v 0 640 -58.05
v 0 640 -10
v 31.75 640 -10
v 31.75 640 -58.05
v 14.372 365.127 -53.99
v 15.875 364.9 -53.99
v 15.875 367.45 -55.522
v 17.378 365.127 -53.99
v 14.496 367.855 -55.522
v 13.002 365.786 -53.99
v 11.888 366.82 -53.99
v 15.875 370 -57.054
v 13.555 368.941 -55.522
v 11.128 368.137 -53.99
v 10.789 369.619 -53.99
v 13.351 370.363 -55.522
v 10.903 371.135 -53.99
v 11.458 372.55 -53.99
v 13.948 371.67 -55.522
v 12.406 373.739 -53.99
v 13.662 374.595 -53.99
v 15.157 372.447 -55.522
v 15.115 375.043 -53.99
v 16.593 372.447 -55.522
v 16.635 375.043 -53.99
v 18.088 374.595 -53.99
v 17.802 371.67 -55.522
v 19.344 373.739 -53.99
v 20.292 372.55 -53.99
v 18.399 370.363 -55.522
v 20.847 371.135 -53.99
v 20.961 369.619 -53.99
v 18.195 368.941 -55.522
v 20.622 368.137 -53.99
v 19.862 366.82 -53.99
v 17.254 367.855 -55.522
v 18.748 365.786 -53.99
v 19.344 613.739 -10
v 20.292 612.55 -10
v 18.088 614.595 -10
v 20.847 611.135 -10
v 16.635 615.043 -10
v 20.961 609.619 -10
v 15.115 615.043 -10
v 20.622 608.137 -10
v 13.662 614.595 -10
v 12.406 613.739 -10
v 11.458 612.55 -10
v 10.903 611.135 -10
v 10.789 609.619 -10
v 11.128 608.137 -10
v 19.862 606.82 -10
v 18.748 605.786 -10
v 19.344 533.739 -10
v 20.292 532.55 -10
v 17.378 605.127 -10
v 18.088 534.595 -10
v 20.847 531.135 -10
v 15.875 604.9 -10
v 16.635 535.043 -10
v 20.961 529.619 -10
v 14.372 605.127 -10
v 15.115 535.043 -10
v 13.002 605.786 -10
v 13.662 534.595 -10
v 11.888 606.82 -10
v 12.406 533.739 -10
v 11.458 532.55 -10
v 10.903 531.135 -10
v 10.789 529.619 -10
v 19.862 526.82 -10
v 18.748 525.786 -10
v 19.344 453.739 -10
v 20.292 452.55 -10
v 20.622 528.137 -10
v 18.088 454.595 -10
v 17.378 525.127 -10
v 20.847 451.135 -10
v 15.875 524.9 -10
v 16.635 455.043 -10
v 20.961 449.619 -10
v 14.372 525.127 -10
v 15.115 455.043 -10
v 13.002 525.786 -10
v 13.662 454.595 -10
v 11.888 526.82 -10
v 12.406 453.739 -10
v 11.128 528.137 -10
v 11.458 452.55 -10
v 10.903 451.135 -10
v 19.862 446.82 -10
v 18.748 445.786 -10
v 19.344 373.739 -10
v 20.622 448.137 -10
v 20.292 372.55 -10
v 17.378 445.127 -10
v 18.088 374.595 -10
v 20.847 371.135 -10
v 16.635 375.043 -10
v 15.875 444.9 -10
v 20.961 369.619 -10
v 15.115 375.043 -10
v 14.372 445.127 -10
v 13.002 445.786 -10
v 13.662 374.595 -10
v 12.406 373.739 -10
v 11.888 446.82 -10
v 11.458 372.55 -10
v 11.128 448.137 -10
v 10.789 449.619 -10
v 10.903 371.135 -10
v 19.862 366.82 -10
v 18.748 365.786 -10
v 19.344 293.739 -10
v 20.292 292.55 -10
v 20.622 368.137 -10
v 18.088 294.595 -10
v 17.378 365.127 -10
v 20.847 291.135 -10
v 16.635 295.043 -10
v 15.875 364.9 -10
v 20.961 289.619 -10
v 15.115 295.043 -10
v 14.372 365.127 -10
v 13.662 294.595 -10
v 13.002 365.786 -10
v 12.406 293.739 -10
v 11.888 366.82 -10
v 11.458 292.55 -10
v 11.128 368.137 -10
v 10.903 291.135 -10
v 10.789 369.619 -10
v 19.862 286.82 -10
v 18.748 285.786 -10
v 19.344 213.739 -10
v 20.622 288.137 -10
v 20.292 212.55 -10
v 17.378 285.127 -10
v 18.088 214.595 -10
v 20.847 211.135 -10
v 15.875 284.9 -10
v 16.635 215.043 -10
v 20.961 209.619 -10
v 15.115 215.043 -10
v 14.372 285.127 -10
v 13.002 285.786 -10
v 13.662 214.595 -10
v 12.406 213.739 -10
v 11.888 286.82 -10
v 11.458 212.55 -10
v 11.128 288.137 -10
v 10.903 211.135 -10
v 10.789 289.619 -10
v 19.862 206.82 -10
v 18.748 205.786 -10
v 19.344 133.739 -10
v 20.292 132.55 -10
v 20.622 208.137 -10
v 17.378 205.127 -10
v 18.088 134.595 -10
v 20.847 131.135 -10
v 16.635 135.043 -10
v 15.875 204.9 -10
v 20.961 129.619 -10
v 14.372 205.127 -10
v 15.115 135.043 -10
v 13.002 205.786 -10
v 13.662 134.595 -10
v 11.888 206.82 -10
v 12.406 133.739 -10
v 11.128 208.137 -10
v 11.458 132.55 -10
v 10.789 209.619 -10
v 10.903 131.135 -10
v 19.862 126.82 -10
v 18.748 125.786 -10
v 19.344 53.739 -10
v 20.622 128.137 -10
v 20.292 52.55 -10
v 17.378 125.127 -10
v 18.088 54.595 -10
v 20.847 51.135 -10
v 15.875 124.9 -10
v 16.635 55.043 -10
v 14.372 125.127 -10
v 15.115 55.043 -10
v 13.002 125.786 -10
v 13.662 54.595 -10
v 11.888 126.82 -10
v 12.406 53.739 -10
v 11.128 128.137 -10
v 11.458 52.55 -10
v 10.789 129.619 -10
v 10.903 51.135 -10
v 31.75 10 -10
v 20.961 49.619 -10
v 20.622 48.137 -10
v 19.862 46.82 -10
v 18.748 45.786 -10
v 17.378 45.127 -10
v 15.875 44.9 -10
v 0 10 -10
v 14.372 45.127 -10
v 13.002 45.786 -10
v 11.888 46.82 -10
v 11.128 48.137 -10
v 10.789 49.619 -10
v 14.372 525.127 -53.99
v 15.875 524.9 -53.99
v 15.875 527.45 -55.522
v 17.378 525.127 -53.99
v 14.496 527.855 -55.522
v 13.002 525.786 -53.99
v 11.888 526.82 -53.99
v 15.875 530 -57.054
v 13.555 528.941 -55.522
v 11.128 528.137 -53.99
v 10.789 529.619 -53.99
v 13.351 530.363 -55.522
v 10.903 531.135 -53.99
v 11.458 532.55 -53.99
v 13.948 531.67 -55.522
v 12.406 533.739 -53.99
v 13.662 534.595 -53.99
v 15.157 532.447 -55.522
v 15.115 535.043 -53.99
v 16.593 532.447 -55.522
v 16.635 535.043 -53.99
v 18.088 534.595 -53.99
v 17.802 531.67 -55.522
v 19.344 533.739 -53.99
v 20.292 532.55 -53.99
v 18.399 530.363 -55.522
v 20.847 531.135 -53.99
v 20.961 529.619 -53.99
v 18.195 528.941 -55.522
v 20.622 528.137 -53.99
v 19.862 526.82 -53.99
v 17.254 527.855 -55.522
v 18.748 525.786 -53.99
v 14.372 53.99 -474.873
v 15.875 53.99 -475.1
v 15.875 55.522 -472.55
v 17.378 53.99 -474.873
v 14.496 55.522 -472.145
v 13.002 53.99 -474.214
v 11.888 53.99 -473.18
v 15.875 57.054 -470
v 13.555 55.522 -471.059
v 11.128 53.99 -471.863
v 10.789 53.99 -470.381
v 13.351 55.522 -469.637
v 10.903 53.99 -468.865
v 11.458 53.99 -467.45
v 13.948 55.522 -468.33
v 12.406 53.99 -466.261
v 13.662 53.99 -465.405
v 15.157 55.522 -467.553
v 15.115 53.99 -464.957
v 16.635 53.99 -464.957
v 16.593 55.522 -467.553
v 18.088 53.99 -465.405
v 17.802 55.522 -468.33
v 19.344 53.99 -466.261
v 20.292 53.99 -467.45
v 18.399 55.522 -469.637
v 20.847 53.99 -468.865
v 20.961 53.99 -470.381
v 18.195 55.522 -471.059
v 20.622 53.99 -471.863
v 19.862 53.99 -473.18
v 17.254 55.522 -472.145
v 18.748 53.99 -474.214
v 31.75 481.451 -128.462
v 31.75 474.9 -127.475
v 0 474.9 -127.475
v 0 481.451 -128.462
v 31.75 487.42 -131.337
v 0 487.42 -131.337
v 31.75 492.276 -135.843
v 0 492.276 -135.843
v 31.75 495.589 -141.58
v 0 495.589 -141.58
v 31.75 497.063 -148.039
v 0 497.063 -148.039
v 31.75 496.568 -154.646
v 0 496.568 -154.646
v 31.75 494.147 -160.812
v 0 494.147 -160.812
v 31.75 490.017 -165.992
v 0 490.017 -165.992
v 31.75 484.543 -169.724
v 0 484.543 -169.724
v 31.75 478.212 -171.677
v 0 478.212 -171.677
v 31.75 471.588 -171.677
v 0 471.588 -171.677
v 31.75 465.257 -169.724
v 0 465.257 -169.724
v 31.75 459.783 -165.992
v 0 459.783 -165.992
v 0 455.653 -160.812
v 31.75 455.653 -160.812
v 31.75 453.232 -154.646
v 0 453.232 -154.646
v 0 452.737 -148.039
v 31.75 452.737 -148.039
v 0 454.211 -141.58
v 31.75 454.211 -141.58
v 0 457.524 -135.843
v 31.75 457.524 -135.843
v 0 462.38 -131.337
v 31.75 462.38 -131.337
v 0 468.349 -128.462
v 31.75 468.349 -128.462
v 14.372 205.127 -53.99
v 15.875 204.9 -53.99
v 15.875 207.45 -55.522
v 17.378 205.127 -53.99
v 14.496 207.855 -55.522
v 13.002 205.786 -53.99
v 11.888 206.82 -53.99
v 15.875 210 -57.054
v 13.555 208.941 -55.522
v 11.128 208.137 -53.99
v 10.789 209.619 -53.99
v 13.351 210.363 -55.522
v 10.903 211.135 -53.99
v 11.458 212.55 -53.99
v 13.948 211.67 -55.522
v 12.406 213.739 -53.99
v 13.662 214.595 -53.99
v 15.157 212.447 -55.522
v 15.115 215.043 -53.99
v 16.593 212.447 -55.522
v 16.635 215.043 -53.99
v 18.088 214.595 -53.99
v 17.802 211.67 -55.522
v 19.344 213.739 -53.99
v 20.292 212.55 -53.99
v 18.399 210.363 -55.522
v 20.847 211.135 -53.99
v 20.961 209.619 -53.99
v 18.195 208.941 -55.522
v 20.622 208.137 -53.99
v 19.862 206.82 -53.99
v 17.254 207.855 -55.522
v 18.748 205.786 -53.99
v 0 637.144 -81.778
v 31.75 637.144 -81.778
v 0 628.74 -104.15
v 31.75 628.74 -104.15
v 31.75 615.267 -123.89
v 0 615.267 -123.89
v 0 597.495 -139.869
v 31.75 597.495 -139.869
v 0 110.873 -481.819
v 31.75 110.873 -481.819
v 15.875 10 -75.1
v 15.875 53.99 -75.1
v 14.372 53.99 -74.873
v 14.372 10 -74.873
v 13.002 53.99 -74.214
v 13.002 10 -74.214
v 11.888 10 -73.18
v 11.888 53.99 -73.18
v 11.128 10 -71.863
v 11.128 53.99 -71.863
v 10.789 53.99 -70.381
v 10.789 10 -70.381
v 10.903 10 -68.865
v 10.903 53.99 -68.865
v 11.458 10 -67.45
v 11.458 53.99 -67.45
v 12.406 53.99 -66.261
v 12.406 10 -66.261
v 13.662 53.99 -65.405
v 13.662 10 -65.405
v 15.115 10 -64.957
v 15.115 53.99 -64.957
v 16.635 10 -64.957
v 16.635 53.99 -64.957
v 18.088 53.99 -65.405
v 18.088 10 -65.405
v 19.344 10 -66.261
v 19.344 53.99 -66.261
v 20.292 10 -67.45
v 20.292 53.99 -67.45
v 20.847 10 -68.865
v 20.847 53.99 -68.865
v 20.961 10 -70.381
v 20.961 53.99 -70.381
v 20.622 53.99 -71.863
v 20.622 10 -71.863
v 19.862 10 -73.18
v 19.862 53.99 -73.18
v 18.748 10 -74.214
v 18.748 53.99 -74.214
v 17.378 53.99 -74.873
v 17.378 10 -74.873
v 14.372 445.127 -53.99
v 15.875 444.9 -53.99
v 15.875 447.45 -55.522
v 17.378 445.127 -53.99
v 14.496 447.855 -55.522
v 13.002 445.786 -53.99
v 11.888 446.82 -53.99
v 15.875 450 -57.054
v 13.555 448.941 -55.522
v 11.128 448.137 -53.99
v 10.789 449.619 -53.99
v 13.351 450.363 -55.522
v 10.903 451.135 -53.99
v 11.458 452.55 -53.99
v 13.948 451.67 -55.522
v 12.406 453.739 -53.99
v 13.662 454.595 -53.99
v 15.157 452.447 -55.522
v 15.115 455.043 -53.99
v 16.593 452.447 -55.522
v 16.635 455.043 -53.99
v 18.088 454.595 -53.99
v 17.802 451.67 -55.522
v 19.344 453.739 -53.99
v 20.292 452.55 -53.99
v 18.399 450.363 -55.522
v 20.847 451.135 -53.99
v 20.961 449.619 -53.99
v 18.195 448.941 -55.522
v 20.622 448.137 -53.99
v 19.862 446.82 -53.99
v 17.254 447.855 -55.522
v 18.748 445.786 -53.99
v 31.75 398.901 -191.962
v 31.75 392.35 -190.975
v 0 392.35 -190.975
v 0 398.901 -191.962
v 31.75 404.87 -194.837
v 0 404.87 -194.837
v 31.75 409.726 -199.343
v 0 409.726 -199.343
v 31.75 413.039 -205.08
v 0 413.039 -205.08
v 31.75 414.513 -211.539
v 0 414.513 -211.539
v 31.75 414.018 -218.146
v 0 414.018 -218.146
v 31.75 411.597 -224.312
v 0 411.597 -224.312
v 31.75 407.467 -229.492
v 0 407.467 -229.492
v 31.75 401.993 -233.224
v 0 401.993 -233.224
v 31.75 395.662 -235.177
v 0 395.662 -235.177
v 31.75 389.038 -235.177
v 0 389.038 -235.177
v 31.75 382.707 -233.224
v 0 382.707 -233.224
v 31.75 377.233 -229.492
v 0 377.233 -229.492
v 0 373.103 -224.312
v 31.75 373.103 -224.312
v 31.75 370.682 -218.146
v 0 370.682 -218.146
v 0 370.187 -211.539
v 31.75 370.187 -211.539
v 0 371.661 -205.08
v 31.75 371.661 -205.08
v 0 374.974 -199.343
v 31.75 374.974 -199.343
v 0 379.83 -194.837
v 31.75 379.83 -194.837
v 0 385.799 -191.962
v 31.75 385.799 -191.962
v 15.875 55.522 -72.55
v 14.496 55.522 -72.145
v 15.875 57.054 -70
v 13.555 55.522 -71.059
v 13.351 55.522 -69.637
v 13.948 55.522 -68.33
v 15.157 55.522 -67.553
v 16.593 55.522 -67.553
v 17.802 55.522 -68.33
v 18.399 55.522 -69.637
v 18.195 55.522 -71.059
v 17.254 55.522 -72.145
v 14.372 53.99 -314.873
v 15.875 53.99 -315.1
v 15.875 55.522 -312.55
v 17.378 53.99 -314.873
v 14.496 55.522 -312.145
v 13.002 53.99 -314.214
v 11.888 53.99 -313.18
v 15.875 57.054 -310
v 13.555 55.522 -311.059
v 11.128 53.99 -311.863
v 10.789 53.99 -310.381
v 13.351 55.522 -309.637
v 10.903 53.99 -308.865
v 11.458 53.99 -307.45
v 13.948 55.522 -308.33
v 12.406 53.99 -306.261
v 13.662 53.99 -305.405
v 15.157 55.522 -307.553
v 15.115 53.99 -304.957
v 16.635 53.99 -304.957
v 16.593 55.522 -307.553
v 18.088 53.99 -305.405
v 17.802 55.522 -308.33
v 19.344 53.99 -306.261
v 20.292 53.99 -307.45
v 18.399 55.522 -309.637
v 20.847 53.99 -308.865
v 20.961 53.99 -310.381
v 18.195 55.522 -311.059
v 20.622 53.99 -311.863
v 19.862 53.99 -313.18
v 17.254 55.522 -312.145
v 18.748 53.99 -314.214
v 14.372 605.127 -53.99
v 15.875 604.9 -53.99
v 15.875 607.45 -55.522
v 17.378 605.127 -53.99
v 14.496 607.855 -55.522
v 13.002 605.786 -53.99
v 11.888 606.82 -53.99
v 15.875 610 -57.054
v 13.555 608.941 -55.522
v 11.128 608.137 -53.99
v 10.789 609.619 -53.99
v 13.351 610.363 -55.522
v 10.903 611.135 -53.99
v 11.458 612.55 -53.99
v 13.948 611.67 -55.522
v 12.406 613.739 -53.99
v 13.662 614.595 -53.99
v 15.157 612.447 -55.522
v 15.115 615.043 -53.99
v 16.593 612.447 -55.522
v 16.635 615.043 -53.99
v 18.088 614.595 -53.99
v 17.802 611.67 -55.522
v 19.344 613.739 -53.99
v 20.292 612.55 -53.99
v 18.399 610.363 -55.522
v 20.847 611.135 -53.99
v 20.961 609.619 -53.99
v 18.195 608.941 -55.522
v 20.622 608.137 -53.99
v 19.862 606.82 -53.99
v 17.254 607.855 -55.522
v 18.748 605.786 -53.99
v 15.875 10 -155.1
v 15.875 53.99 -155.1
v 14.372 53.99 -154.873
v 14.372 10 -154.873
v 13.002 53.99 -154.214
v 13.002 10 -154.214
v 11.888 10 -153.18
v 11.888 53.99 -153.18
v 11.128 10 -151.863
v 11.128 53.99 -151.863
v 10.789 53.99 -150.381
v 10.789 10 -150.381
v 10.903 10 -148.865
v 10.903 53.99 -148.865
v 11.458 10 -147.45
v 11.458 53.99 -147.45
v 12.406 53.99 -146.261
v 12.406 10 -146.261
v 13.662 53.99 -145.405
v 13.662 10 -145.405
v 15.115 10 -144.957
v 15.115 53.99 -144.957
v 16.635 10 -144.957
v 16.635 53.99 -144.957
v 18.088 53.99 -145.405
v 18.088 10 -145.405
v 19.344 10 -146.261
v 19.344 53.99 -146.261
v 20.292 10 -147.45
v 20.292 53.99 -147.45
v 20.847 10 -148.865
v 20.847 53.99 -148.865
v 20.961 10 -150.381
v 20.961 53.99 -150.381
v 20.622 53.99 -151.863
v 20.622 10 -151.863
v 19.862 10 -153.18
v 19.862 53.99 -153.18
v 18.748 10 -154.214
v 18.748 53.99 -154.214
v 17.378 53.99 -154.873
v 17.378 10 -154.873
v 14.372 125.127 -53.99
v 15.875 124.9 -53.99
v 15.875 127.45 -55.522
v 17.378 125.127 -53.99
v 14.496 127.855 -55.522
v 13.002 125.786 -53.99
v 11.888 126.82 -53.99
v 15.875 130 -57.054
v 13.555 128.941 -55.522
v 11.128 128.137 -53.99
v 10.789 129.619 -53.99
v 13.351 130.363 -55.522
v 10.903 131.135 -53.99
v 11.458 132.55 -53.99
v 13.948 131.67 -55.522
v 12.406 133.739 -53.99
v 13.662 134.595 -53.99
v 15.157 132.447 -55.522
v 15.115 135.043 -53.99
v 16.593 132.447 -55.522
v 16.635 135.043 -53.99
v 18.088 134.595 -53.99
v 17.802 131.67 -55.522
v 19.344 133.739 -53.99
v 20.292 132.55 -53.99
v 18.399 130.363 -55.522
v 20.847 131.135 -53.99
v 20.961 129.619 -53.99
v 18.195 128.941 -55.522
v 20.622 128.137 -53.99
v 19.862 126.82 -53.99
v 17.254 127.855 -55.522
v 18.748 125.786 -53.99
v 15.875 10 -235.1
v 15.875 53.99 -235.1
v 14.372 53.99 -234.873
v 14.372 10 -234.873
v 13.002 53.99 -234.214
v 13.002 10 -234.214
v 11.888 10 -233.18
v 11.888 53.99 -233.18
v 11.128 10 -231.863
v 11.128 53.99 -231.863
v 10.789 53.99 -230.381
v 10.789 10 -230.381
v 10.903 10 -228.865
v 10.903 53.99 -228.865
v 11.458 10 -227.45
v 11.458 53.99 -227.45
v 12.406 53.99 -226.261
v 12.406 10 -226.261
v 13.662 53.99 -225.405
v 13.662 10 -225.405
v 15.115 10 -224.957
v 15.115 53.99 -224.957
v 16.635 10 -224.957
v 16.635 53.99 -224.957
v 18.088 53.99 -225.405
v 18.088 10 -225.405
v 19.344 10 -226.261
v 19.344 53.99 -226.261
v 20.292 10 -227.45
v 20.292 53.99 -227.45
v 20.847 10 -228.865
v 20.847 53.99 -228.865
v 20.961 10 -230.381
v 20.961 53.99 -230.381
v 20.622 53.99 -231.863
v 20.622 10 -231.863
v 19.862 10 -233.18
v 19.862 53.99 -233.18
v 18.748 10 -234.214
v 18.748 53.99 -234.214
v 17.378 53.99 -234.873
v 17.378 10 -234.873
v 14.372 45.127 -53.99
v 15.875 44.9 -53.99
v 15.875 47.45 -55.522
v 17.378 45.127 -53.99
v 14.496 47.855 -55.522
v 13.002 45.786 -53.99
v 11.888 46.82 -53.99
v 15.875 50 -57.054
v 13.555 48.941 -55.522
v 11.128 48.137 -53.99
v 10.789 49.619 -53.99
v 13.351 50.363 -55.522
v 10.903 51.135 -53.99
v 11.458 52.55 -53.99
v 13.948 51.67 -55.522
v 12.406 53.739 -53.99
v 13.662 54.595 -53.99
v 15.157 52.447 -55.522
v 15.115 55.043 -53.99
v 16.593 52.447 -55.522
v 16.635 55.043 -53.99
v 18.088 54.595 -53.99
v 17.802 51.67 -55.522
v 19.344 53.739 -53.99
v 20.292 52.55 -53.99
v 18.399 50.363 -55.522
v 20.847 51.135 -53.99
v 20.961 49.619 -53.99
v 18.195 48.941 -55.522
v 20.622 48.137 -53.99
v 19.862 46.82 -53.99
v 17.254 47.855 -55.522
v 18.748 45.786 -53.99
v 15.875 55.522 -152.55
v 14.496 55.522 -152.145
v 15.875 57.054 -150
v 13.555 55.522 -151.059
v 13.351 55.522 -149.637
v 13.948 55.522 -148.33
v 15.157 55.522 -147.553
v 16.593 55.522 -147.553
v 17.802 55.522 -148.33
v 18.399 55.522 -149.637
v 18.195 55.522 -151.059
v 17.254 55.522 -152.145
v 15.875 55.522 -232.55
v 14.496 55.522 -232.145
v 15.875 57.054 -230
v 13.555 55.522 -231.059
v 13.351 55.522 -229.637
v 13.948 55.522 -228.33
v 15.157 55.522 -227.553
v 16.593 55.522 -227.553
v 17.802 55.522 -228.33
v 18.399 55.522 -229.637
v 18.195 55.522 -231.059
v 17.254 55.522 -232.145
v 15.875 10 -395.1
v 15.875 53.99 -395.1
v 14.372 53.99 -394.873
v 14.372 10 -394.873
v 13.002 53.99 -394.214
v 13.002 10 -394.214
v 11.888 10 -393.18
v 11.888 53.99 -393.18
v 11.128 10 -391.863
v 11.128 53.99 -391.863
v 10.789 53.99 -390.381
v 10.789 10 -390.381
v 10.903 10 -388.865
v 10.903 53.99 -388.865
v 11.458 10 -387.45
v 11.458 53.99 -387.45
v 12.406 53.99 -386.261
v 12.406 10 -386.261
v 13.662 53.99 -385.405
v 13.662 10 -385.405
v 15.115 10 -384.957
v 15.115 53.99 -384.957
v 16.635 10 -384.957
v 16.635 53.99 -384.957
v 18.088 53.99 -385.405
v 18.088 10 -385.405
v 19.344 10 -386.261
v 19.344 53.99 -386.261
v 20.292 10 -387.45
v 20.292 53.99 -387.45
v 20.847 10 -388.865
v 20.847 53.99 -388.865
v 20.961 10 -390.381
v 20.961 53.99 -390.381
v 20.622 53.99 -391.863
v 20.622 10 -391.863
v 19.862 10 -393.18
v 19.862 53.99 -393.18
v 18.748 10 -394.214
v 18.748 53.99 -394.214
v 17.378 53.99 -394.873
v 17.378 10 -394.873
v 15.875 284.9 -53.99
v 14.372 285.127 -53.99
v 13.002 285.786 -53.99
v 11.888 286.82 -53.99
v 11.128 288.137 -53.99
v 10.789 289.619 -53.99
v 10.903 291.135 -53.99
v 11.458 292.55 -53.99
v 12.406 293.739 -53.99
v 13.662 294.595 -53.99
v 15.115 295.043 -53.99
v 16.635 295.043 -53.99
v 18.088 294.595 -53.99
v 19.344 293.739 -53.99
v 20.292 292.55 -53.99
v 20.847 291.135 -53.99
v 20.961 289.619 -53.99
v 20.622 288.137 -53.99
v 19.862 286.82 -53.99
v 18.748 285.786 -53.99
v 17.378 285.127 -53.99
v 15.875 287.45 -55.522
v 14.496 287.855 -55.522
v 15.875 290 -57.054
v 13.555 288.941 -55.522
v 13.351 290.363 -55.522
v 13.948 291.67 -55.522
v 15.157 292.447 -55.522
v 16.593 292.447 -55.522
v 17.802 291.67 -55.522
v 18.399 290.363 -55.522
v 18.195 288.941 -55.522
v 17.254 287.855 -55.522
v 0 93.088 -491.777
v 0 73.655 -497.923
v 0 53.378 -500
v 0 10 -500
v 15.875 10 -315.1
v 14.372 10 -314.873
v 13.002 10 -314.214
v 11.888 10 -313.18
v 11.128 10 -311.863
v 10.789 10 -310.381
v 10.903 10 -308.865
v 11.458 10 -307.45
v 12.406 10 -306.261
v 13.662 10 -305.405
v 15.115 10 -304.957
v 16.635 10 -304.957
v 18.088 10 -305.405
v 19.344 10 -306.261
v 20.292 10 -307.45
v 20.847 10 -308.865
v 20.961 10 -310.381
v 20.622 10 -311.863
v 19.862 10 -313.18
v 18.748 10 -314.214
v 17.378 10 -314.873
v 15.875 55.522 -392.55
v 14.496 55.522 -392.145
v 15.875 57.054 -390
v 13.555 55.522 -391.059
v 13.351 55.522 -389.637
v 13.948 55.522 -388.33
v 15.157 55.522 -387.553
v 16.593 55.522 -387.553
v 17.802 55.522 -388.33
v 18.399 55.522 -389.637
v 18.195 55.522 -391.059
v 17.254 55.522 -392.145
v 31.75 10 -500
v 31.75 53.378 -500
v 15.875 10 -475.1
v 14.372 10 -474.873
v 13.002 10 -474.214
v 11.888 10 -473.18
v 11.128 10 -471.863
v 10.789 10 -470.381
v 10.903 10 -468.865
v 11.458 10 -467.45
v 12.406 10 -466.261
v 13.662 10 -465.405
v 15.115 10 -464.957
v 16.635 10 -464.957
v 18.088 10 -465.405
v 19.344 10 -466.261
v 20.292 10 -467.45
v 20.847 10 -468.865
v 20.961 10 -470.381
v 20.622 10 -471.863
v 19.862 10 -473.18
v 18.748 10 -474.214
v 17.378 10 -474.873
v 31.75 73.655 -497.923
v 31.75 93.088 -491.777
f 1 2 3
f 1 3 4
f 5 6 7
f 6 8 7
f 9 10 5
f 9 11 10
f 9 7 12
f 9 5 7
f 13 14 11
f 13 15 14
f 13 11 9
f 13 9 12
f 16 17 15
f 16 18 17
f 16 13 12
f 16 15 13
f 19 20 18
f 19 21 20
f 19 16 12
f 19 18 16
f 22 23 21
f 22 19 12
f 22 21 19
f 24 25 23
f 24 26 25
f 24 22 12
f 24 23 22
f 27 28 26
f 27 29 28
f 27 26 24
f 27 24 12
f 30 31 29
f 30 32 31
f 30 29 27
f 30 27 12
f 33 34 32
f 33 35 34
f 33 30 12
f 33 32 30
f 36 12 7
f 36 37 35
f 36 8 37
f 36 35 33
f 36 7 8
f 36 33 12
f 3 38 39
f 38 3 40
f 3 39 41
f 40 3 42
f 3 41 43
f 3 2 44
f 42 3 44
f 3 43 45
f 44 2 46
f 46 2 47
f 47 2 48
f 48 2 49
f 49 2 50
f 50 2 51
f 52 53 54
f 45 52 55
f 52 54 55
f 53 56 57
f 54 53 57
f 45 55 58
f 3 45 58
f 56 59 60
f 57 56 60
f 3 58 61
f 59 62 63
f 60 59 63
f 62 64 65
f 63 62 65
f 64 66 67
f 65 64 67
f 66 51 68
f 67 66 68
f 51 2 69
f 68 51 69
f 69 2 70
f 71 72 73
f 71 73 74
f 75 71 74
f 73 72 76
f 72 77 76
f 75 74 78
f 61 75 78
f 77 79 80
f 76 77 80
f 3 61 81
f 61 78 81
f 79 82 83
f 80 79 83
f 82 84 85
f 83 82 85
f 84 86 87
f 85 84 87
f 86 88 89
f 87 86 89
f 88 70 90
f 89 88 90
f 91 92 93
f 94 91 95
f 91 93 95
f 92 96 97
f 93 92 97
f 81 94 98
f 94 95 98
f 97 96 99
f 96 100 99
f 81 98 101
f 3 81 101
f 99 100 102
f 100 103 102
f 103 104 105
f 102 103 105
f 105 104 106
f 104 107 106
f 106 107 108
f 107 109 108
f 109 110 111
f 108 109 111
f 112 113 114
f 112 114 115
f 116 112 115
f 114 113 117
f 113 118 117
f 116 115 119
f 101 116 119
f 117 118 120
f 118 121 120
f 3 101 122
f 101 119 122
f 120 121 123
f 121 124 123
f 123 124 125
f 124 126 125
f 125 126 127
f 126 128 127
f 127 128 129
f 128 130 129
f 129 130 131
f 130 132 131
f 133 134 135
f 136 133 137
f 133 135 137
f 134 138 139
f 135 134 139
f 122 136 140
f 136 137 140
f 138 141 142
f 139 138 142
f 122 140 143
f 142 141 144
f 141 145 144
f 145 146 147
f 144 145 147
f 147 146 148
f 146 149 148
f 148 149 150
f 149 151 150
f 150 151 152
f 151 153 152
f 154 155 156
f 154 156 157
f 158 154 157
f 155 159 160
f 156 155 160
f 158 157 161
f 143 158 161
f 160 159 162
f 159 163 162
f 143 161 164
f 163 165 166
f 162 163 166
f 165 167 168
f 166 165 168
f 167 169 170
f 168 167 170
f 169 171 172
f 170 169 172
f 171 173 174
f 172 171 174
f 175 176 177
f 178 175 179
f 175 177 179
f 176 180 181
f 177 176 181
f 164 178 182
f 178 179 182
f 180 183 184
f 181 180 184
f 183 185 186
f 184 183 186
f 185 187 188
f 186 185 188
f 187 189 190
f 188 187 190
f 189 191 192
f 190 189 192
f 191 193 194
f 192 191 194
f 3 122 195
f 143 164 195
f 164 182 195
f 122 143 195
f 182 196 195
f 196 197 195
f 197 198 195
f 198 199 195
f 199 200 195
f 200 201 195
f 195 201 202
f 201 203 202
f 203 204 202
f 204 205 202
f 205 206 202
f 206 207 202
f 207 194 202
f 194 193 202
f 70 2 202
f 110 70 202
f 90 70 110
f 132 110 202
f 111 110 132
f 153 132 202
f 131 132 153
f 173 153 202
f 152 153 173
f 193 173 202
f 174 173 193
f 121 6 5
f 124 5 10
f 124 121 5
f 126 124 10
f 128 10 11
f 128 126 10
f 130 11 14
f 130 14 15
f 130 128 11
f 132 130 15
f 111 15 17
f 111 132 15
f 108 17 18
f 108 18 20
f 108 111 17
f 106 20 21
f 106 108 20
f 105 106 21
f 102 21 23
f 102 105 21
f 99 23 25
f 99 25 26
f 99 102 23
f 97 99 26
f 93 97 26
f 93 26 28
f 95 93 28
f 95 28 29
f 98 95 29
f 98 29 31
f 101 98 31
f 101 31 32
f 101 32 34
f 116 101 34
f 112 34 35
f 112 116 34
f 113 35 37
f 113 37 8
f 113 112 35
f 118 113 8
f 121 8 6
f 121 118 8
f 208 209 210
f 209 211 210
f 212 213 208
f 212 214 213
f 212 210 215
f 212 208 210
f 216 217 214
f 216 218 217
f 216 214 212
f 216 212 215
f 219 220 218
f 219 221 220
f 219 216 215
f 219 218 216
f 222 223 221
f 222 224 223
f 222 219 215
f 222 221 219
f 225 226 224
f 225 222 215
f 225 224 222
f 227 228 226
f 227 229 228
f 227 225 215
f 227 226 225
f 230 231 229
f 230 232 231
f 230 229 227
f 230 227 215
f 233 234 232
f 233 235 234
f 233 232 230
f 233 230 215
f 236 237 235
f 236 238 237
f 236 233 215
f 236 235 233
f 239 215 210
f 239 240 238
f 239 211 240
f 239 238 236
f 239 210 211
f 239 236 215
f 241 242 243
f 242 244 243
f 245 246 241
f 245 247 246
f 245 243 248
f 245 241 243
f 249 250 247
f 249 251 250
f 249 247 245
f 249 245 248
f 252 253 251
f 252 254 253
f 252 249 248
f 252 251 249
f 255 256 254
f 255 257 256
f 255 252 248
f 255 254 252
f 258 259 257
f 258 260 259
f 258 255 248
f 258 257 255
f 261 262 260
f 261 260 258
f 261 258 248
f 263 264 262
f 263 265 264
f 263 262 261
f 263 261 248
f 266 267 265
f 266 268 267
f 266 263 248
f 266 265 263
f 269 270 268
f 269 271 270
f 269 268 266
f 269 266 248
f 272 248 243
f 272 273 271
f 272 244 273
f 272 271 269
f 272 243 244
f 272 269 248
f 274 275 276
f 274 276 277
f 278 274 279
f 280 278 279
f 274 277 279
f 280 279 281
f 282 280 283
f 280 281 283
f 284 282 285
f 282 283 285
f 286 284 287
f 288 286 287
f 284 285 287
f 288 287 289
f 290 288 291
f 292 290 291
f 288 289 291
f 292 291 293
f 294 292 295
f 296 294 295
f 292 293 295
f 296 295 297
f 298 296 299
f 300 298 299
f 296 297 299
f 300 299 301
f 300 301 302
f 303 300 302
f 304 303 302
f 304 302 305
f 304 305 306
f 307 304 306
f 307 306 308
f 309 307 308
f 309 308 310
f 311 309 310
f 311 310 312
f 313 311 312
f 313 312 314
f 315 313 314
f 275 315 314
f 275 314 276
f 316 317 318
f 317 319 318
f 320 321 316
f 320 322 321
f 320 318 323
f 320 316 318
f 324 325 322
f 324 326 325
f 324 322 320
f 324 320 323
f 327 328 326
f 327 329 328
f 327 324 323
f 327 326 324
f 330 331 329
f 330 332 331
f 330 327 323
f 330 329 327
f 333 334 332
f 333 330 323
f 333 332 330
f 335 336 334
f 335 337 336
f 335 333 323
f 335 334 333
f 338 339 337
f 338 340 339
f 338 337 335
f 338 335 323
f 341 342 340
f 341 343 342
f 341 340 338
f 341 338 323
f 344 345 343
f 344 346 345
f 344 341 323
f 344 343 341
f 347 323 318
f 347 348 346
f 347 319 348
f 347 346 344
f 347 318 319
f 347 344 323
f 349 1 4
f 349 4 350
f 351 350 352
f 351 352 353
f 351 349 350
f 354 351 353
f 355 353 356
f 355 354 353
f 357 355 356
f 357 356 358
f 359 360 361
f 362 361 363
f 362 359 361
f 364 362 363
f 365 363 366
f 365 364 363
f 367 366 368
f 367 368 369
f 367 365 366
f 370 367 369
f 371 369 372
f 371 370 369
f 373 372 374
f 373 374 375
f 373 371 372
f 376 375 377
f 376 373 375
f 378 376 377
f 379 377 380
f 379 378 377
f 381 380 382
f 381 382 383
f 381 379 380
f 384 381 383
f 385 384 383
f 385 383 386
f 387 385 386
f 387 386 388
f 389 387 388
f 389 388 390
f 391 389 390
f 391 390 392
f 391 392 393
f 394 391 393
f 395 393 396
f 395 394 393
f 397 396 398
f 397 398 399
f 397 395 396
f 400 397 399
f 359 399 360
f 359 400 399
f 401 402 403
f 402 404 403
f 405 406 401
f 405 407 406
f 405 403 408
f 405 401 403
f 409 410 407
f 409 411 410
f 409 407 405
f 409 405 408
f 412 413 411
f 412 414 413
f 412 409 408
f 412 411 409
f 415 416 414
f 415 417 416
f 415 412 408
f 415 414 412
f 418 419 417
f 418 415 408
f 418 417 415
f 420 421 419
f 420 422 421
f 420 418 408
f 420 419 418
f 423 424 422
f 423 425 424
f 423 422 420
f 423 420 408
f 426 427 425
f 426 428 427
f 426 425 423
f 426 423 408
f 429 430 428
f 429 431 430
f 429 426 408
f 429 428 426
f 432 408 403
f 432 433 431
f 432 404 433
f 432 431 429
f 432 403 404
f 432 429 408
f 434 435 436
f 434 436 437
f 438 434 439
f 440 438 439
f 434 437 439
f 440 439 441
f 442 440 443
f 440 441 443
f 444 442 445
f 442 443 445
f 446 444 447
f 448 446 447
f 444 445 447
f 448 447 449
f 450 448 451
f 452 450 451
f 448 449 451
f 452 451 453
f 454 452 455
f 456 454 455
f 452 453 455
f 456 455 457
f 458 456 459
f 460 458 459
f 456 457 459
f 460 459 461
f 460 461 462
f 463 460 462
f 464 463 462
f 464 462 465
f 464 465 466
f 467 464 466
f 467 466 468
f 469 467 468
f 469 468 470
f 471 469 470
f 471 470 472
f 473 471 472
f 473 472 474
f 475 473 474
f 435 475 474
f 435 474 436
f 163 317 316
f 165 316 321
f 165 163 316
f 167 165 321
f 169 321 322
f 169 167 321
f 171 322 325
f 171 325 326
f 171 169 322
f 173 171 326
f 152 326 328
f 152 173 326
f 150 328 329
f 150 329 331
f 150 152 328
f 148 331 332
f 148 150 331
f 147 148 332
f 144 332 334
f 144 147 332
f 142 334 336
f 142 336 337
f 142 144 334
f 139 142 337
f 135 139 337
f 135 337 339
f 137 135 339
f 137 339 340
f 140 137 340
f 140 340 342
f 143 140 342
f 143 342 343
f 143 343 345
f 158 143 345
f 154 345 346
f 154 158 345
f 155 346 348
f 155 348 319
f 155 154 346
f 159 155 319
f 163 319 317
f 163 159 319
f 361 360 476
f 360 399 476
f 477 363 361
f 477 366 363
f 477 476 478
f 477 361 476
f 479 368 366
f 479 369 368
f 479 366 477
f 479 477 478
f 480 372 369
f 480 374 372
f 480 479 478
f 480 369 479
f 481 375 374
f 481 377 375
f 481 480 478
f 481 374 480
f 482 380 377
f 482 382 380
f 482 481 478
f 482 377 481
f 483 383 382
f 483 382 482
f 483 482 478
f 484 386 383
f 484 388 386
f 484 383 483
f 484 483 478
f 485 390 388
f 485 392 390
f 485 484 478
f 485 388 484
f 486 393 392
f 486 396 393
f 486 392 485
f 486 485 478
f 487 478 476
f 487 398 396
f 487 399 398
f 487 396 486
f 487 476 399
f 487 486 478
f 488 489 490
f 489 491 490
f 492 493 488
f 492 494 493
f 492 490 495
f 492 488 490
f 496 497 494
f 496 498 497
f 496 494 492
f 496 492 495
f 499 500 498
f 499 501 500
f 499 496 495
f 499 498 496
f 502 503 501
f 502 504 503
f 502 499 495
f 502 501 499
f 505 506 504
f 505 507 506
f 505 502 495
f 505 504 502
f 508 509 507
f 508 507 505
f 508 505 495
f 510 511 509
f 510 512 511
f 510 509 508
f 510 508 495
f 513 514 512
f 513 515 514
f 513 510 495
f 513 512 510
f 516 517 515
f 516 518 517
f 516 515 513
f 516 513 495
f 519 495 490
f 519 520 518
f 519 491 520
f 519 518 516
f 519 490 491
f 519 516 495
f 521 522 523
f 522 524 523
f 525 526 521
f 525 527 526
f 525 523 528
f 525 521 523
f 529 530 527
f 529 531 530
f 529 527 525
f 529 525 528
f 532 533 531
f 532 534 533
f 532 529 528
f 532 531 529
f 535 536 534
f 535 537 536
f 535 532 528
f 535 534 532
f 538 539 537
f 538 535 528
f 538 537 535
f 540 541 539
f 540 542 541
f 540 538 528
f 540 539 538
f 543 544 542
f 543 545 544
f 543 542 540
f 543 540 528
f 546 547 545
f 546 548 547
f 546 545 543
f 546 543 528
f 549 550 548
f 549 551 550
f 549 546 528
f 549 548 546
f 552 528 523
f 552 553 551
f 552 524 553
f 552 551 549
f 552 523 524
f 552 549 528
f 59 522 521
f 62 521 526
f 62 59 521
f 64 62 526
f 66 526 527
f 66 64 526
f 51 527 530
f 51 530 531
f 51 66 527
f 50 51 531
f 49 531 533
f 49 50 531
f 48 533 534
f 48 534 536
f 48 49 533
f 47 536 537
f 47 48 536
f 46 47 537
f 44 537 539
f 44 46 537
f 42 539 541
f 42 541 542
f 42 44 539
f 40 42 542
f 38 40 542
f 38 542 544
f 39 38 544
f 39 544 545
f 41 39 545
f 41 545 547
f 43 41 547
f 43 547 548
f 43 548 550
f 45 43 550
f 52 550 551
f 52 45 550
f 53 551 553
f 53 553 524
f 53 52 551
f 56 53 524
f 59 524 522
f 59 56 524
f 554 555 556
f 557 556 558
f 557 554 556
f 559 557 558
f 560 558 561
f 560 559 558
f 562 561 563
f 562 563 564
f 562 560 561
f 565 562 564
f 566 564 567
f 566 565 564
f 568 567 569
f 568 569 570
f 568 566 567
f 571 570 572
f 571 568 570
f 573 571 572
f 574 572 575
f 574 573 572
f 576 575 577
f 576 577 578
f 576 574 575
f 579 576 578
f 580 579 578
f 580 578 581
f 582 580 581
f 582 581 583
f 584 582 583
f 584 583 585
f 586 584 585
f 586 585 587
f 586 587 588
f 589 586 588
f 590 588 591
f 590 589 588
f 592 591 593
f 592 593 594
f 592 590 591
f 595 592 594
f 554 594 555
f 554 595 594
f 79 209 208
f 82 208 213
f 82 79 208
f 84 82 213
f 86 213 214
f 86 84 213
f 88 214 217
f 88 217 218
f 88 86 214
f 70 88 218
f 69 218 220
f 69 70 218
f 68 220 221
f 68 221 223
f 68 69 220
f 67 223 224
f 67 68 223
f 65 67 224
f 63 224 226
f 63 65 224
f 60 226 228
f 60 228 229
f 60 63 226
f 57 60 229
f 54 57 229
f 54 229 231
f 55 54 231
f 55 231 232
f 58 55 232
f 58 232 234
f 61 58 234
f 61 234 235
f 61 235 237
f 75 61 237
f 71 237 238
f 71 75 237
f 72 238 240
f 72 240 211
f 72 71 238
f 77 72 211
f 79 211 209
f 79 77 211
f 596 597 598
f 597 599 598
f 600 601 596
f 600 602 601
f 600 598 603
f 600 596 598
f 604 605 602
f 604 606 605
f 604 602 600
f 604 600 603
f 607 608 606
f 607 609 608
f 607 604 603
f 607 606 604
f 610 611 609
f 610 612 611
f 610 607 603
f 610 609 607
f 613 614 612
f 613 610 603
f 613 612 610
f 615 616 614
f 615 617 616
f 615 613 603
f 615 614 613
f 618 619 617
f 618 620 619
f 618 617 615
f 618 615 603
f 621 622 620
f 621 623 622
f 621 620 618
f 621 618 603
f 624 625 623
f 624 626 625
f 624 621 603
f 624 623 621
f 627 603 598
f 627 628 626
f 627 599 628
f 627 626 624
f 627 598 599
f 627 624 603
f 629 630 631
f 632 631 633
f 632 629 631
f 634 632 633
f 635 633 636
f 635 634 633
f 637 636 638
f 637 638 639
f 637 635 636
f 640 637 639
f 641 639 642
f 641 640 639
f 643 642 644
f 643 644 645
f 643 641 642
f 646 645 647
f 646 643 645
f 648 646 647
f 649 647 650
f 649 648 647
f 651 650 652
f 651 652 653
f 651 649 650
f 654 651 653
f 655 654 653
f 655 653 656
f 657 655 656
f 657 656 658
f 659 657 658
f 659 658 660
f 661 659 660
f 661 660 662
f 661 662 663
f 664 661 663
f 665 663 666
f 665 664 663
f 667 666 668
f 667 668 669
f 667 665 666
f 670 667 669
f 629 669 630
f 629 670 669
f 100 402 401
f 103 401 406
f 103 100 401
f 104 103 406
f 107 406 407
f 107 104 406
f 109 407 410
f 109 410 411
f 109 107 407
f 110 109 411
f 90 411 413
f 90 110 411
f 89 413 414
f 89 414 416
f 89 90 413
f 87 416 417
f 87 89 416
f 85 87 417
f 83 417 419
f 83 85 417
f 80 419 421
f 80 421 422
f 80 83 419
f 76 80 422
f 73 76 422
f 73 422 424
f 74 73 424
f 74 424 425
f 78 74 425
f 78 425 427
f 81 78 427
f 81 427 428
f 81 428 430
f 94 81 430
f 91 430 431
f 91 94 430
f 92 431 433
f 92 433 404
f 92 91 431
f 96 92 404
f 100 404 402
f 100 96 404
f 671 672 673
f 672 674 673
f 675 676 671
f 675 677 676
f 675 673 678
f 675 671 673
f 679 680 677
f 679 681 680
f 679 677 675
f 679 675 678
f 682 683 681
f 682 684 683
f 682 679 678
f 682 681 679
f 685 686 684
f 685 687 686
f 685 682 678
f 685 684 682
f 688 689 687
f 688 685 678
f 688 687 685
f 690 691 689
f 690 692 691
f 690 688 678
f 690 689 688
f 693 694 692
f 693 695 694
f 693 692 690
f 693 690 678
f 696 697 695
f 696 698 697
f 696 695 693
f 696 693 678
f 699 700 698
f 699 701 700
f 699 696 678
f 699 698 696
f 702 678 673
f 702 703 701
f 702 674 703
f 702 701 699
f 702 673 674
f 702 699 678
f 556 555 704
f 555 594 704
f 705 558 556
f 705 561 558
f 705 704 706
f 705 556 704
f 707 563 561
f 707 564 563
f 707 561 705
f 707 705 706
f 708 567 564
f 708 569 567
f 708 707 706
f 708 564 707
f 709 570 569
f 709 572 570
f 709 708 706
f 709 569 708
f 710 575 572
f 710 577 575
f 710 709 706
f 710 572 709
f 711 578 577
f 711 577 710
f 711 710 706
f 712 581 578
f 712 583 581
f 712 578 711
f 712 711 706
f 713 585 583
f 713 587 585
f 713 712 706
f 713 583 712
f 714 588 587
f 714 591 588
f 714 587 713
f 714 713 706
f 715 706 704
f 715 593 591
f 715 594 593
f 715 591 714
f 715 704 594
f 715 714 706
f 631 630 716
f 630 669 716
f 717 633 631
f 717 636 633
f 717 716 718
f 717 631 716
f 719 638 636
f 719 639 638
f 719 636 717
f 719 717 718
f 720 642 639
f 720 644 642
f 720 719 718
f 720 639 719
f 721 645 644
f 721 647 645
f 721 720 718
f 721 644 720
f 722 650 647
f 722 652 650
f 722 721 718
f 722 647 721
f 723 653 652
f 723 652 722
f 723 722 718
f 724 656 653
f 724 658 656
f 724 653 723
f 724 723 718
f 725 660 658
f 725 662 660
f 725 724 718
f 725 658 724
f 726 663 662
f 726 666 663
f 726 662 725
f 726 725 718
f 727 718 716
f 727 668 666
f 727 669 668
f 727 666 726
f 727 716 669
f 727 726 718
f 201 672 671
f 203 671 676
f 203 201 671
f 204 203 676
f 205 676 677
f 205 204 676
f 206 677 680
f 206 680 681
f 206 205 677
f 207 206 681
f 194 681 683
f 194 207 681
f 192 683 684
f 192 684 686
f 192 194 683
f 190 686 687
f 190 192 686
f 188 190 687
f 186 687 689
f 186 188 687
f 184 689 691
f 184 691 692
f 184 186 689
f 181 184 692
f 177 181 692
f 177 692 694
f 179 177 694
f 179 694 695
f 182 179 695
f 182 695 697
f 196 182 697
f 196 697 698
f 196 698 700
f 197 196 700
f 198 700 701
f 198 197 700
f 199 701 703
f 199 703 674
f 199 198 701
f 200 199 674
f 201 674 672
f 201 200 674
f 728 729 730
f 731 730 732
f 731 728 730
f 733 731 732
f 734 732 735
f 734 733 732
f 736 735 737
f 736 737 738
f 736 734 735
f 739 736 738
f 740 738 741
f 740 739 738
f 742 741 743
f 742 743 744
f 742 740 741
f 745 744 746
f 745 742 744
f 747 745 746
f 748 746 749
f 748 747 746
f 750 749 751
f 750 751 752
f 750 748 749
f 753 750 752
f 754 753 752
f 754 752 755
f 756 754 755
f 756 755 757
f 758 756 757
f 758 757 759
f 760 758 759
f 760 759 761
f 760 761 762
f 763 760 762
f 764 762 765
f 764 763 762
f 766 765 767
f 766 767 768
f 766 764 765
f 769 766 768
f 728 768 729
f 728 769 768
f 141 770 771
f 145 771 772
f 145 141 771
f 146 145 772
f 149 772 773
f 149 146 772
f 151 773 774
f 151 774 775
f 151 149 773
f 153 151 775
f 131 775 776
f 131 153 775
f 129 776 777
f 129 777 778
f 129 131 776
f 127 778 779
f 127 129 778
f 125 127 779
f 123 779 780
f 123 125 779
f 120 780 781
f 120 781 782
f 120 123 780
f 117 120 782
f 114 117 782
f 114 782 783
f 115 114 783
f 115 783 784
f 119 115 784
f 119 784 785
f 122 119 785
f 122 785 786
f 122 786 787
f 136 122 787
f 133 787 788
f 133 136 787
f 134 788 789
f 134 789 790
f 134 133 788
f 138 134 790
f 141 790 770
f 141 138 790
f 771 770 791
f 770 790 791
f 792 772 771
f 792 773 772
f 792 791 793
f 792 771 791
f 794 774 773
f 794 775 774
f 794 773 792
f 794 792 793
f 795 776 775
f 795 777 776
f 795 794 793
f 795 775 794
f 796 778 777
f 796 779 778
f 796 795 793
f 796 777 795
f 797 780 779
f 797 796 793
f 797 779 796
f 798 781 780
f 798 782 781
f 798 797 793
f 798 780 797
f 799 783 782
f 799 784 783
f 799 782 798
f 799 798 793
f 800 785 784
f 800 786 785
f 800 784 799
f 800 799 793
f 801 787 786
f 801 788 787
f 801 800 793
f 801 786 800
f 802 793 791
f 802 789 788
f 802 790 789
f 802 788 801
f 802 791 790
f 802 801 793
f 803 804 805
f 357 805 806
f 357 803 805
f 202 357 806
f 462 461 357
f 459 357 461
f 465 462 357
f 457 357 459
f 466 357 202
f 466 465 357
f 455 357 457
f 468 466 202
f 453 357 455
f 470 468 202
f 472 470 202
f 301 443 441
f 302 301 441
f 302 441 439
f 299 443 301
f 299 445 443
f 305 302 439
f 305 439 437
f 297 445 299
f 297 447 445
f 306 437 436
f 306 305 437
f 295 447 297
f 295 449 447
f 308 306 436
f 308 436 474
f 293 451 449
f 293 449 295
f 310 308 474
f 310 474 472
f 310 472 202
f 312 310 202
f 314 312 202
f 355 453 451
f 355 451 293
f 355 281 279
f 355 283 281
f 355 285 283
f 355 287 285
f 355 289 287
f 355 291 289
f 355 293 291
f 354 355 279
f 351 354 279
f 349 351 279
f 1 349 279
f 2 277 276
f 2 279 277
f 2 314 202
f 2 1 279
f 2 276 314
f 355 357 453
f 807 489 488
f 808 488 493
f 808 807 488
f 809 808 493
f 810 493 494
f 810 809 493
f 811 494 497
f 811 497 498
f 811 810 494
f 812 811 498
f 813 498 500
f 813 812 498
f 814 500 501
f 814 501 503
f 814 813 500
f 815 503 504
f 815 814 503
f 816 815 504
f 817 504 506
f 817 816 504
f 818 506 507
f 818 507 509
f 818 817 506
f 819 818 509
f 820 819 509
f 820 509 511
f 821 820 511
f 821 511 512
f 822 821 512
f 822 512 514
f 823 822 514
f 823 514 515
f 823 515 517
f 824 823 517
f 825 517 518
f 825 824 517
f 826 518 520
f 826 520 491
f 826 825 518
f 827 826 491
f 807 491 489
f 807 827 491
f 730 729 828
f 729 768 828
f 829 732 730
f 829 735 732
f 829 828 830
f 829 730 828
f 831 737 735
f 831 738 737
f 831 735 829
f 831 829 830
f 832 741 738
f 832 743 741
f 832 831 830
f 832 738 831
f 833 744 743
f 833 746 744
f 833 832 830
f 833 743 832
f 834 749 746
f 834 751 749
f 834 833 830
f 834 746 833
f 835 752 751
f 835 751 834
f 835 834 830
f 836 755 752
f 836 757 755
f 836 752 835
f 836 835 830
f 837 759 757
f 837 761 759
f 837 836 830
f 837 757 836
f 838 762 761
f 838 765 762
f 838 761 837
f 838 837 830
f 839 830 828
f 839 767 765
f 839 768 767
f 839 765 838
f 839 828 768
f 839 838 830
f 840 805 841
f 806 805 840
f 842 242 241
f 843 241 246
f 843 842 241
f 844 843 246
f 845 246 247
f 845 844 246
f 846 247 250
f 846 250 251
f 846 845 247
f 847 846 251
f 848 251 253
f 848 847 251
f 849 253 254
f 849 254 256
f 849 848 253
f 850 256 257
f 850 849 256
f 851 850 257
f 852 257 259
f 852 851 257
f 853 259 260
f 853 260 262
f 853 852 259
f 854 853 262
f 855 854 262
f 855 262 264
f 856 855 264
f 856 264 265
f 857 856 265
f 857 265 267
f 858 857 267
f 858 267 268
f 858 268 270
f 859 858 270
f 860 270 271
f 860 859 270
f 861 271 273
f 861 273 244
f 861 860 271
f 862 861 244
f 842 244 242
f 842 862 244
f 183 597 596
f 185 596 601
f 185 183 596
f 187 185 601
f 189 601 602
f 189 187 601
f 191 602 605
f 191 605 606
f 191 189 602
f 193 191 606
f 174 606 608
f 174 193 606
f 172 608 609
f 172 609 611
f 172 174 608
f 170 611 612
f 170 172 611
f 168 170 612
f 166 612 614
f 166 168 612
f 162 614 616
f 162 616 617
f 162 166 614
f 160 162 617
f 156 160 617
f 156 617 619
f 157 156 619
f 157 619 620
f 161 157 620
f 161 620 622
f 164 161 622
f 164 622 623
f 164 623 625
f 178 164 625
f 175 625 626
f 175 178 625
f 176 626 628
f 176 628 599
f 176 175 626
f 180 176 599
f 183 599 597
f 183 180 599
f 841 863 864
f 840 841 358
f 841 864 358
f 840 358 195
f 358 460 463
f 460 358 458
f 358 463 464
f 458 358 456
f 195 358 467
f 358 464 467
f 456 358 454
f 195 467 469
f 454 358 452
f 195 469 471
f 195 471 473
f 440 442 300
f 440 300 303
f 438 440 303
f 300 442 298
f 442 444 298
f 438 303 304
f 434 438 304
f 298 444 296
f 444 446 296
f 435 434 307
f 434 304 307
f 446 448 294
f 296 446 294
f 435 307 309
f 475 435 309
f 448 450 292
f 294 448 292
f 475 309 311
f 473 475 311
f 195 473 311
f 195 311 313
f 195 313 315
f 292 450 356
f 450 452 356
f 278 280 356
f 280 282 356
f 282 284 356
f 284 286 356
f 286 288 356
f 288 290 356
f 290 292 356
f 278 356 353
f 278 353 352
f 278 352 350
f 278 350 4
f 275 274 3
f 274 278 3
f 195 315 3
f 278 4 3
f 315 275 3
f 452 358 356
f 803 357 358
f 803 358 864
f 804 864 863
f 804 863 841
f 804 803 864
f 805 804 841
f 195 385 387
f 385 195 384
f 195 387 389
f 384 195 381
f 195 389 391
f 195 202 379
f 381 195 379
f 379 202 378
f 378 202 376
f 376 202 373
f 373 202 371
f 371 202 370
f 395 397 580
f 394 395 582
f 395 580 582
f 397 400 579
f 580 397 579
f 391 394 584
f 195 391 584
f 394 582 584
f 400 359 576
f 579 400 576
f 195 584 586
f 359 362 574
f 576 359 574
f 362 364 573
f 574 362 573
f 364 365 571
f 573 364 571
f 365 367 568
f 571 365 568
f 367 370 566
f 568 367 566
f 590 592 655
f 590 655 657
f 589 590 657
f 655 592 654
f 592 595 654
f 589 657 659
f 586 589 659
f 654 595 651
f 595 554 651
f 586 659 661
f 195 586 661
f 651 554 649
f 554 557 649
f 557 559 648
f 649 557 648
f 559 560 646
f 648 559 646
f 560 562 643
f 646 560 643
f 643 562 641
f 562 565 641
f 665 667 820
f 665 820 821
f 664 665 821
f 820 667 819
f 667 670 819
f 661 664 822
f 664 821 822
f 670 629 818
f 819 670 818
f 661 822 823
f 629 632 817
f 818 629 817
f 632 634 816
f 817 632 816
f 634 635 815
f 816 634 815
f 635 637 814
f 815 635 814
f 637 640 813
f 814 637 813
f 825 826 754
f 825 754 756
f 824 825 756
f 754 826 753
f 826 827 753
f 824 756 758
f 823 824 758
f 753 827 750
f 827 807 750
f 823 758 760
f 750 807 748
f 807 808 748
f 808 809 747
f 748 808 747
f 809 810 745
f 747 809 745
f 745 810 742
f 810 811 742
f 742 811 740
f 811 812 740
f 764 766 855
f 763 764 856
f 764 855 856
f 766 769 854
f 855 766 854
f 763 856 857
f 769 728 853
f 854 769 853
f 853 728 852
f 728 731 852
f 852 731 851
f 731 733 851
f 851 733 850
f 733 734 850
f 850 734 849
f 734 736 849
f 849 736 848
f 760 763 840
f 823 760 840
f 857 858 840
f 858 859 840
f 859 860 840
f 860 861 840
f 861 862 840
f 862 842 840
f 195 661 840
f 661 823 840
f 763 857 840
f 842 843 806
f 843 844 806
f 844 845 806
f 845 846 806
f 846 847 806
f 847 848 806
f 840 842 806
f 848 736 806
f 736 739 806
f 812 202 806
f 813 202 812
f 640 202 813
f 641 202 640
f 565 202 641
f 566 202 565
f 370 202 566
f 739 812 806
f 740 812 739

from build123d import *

# Parameters (mm, degrees)
BOSS_EXTRUDE1_DEPTH = 31.75
CUT_EXTRUDE1_DEPTH  = 813.777990905
LPATTERN1_COUNT     = 8
LPATTERN1_PITCH     = 80
LPATTERN2_COUNT     = 6
LPATTERN2_PITCH     = 80
SKETCH8_R           = 22.225
CUT_EXTRUDE2_DEPTH  = 813.777990905


with BuildPart() as part:
    # Sketch1 → Boss-Extrude1 (new body)
    with BuildSketch(Plane(origin=(0, 0, 0), x_dir=(0, 0, -1), z_dir=(1, 0, 0))):
        with BuildLine():
            Line((0, 0), (0, 640))
            Line((0, 640), (58.049523734, 640))
            ThreePointArc((58.049523734, 640), (104.150200697, 628.73966184), (139.86869342, 597.494551671))
            Line((139.86869342, 597.494551671), (481.819169686, 110.872720062))
            ThreePointArc((481.819169686, 110.872720062), (495.346517945, 83.528483741), (500, 53.378168391))
            Line((500, 53.378168391), (500, 0))
            Line((500, 0), (0, 0))
        make_face()
    extrude(amount=BOSS_EXTRUDE1_DEPTH)

    # Sketch2 → Cut-Extrude1 (cut, through all)
    with BuildSketch(Plane.ZY):
        Polygon((0, 640), (-10, 640), (-10, 10), (-500, 10), (-500, 0), (0, 0), align=None)
    extrude(amount=-CUT_EXTRUDE1_DEPTH, mode=Mode.SUBTRACT)

    # Sketch4 → M12 Tapped Hole1 (revolve, cut)
    with BuildSketch(Plane(origin=(15.875, 50, -10), x_dir=(0, -1, 0), z_dir=(1, 0, 0))):
        Polygon((0, 0), (0, 47.054389157), (5.1, 43.99), (5.1, 0), align=None)
    m12_tapped_hole1 = revolve(axis=Axis((15.875, 50, -3.65), (0, 0, -1)), mode=Mode.SUBTRACT)

    # LPattern1: M12 Tapped Hole1 ×8
    with Locations(*[(0, i * LPATTERN1_PITCH, 0) for i in range(1, LPATTERN1_COUNT)]):
        add(m12_tapped_hole1, mode=Mode.SUBTRACT)

    # Sketch6 → M12 Tapped Hole2 (revolve, cut)
    with BuildSketch(Plane(origin=(15.875, 10, -70), x_dir=(0, 0, -1), z_dir=(1, 0, 0))):
        Polygon((0, 0), (0, 47.054389157), (5.1, 43.99), (5.1, 0), align=None)
    m12_tapped_hole2 = revolve(axis=Axis((15.875, 3.65, -70), (0, 1, 0)), mode=Mode.SUBTRACT)

    # LPattern2: M12 Tapped Hole2 ×6
    with Locations(*[(0, 0, -i * LPATTERN2_PITCH) for i in range(1, LPATTERN2_COUNT)]):
        add(m12_tapped_hole2, mode=Mode.SUBTRACT)

    # Sketch8 → Cut-Extrude2 (cut, through all)
    with BuildSketch(Plane.ZY):
        with Locations((-213.2, 392.35)):
            Circle(SKETCH8_R)
        with Locations((-149.7, 474.9)):
            Circle(SKETCH8_R)
    extrude(amount=-CUT_EXTRUDE2_DEPTH, mode=Mode.SUBTRACT)


solid = part.part
